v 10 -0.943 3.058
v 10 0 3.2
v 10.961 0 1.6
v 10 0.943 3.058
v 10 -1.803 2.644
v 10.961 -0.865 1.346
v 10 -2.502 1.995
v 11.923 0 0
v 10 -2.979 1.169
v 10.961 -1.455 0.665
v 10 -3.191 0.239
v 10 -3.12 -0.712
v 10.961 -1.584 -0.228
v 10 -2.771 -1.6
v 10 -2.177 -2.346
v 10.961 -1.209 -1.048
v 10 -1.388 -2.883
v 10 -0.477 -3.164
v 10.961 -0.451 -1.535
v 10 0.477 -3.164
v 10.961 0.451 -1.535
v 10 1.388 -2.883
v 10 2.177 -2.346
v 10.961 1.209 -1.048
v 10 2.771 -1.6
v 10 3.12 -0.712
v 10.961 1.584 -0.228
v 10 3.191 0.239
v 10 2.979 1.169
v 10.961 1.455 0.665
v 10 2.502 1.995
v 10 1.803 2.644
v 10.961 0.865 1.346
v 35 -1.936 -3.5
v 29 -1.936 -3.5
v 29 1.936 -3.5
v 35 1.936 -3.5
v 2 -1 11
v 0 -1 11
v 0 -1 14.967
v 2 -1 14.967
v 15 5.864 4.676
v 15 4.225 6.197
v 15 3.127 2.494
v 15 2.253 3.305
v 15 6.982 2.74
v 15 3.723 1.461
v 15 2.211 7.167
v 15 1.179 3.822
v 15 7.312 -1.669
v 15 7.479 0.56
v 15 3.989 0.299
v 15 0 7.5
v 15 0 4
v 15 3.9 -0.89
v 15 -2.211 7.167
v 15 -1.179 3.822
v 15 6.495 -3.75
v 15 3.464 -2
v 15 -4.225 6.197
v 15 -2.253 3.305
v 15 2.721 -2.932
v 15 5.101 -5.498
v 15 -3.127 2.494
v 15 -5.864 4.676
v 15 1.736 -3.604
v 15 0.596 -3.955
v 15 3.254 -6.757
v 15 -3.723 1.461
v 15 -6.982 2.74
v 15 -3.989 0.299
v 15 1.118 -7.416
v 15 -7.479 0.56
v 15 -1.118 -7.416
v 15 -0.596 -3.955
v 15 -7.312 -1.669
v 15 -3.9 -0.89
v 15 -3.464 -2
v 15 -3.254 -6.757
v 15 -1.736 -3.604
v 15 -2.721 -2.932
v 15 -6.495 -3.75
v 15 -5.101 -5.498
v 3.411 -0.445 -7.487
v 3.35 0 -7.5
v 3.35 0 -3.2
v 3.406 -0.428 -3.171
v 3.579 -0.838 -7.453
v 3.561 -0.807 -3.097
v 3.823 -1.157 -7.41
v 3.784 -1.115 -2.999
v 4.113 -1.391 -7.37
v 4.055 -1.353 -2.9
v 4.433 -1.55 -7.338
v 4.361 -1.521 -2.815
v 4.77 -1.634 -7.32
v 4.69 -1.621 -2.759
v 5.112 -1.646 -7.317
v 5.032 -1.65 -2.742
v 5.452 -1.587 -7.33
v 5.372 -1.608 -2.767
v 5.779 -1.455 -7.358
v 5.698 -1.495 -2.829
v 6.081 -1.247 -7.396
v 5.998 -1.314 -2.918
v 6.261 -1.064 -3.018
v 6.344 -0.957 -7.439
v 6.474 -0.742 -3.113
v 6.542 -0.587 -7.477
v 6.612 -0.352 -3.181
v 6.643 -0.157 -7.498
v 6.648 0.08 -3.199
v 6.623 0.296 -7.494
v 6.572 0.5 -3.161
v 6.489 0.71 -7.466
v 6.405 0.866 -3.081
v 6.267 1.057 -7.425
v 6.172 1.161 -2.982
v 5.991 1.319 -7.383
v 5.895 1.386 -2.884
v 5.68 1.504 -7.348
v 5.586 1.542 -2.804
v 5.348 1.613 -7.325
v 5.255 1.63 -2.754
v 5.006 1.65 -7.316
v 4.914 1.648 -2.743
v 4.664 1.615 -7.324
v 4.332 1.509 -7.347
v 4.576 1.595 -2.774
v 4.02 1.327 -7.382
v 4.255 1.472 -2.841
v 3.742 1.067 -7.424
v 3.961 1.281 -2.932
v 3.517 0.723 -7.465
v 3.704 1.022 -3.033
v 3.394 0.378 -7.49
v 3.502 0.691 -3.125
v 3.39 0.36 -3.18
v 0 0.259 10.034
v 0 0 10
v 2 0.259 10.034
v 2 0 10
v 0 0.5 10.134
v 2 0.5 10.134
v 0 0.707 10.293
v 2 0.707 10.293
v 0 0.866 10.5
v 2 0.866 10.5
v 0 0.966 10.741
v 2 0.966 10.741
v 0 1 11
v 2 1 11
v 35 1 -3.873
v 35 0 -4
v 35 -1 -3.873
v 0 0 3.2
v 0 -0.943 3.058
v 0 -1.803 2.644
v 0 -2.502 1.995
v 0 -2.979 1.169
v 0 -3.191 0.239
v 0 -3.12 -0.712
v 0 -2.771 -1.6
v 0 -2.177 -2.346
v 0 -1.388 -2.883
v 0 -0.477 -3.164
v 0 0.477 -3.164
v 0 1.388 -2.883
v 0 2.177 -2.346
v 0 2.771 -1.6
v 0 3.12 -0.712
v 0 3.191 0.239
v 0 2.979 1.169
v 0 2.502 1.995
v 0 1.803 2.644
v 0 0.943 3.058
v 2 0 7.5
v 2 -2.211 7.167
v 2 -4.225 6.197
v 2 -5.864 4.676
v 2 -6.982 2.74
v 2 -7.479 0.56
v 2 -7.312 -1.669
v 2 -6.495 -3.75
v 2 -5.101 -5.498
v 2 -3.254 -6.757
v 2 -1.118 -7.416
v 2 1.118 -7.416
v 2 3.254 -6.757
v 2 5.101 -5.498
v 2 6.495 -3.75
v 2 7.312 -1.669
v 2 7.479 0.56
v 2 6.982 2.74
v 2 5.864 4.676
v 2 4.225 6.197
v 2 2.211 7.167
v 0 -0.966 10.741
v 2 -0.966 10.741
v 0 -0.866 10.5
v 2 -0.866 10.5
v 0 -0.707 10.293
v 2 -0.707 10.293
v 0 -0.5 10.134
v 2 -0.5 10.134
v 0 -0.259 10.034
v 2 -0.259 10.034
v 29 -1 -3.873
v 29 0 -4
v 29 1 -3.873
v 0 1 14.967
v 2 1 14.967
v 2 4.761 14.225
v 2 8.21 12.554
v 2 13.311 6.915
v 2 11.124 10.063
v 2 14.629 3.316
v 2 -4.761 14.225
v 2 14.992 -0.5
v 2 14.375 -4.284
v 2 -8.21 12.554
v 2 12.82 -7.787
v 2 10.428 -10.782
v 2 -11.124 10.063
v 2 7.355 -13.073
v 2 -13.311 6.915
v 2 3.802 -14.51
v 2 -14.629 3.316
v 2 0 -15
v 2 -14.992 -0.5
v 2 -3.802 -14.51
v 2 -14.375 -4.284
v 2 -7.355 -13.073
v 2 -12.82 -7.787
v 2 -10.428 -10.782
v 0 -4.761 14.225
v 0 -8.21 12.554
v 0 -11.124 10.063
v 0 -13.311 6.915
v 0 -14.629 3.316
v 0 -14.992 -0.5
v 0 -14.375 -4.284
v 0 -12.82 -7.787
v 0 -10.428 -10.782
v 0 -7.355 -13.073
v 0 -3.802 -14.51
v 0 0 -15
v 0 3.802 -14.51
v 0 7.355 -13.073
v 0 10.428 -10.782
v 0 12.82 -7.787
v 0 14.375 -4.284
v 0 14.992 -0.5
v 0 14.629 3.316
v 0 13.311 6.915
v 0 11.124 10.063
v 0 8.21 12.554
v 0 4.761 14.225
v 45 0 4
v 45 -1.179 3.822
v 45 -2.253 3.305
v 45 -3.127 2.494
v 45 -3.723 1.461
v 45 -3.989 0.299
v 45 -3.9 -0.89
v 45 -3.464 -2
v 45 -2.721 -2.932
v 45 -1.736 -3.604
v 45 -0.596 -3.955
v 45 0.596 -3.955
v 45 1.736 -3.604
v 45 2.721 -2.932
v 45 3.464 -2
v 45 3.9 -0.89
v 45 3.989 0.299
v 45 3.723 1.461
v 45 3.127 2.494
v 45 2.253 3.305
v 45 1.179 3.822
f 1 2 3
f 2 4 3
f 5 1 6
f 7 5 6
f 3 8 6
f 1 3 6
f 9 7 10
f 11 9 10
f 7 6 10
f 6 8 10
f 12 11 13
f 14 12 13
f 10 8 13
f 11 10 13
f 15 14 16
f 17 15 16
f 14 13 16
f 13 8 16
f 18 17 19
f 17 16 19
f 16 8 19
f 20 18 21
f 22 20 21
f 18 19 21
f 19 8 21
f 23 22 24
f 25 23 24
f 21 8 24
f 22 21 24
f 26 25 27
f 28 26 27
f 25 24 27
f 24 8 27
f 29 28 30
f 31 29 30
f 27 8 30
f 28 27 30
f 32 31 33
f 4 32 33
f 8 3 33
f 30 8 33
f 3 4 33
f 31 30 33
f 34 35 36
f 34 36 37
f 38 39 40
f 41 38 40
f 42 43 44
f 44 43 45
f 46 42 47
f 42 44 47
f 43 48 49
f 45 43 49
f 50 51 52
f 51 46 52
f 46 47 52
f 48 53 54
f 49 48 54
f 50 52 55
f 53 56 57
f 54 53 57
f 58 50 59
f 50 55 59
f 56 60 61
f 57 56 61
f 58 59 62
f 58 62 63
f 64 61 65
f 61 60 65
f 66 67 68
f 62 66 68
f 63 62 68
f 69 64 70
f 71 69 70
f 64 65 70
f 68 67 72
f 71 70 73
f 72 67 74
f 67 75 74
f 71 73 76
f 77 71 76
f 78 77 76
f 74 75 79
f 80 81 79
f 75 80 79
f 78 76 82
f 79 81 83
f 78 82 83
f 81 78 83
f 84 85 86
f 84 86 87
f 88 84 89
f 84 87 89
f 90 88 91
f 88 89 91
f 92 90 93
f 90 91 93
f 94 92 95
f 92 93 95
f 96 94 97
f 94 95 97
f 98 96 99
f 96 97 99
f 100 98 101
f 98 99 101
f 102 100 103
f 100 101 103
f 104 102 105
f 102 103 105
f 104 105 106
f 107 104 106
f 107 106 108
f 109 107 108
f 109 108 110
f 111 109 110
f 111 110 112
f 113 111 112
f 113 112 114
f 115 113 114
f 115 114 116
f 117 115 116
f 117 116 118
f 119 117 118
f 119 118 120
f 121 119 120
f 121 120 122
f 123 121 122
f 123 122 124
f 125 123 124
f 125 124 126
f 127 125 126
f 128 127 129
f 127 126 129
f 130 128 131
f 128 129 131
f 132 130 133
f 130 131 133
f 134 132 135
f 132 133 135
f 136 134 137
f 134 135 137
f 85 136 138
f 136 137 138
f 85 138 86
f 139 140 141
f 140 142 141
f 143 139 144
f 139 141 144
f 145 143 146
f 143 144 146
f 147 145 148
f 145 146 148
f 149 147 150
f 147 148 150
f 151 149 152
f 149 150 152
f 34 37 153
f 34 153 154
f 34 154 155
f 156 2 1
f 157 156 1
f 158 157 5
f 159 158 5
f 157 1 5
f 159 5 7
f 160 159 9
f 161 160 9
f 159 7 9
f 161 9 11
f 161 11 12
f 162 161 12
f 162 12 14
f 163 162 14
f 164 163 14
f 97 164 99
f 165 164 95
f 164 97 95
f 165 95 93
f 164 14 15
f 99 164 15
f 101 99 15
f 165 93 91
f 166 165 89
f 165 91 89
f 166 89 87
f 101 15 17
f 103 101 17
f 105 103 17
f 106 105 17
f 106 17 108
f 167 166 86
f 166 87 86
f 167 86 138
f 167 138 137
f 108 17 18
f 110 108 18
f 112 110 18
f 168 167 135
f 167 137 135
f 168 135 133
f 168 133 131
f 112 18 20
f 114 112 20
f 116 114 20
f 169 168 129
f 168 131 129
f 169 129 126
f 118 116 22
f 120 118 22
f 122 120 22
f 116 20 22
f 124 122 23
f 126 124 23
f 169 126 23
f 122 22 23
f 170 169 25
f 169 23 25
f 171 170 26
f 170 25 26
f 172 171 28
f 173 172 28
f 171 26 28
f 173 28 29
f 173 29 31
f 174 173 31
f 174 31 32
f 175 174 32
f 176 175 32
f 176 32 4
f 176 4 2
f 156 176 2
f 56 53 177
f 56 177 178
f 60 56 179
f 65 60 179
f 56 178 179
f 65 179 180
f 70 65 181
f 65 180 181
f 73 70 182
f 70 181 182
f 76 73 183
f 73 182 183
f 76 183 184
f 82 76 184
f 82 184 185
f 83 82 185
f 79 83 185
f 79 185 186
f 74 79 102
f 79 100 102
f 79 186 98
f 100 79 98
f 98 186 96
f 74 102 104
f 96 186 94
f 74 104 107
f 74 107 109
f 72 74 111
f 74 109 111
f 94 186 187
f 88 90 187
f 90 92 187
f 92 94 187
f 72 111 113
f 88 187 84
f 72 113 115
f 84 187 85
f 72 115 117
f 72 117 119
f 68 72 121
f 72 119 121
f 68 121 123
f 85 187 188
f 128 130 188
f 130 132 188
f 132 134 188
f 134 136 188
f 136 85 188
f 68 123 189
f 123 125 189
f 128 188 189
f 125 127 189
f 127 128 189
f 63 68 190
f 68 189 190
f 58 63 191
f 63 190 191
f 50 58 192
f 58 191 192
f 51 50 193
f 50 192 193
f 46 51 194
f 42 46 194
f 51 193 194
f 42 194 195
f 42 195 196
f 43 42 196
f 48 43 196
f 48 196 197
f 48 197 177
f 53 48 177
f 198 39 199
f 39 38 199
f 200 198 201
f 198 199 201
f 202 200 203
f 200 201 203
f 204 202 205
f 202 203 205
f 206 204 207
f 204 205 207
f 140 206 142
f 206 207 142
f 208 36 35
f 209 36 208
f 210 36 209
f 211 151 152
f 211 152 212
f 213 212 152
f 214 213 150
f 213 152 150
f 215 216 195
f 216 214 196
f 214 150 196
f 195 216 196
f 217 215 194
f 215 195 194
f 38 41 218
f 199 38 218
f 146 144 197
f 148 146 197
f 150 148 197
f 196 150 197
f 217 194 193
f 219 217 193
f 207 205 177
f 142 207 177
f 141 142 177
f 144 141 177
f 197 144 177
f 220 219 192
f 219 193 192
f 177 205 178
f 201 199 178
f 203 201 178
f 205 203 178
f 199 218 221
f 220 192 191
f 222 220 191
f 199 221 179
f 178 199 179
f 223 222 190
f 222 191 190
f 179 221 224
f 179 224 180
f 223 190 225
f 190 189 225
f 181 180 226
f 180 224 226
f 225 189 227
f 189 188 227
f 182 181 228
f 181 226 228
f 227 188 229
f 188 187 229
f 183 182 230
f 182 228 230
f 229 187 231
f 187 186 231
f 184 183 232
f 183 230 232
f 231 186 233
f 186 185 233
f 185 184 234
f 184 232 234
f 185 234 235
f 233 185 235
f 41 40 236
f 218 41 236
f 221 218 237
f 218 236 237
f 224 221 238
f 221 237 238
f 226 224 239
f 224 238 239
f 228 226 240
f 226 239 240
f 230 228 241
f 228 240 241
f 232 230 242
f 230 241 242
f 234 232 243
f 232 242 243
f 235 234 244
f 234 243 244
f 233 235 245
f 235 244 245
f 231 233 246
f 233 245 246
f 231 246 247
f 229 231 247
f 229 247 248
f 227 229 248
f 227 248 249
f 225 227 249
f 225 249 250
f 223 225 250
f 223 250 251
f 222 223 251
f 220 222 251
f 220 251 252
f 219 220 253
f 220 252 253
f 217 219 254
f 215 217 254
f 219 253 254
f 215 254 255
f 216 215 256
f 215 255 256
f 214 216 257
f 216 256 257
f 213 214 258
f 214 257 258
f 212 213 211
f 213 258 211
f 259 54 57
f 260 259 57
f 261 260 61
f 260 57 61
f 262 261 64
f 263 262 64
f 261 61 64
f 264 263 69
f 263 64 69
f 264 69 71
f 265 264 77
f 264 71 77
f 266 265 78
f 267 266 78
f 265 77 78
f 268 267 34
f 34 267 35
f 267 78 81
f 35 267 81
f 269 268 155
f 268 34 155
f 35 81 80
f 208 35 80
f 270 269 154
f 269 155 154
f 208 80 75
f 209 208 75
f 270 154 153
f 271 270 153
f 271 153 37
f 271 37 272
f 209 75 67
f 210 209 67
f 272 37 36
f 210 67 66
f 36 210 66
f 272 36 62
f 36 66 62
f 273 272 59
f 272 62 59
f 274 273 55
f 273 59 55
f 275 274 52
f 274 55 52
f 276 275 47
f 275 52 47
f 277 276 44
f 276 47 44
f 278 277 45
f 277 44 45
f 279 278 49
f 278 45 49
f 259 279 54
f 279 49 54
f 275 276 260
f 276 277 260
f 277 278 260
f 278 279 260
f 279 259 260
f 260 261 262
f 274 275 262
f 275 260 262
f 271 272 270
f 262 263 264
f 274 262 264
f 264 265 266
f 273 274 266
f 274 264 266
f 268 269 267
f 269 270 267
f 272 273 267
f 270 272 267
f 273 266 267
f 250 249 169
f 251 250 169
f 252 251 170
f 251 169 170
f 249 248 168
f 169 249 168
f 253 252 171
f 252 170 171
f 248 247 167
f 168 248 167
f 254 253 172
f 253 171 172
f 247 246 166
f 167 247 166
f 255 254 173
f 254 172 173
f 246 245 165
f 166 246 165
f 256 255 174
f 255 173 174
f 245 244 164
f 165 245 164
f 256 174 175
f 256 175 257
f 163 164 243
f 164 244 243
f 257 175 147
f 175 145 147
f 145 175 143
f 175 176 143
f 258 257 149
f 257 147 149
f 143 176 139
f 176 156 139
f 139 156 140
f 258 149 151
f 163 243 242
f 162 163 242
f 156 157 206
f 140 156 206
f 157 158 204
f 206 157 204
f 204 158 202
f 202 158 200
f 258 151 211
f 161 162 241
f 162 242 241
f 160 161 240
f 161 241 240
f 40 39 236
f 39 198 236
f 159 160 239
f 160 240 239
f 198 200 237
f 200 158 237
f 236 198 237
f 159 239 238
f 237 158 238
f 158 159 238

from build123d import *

# Parameters (mm, degrees)
SCHNITT_LINEAR_AUSTRAGEN1_DEPTH      = 50.749371855
SCHNITT_LINEAR_AUSTRAGEN1_DEPTH_BACK = 50.749371855
SKIZZE3_W                            = 6
SKIZZE3_H                            = 0.5
M4_GEWINDEBOHRUNG2_D                 = 3.3
M4_GEWINDEBOHRUNG2_DEPTH             = 8.5
M4_GEWINDEBOHRUNG2_TIP               = 0.991420021
SKIZZE10_W                           = 5.838792557
SKIZZE10_H                           = 2
SCHNITT_LINEAR_AUSTRAGEN2_DEPTH      = 2
VERRUNDUNG1_R                        = 1


with BuildPart() as part:
    # Skizze1 → Rotation1 (revolve)
    with BuildSketch(Plane.XY, mode=Mode.PRIVATE) as rotation1_sk:
        Polygon((0, 3.2), (10, 3.2), (11.922753981, 0), (45, 0), (45, 4), (15, 4), (15, 7.5), (2, 7.5), (2, 15), (0, 15), (0, 7.5), align=None)
    revolve(rotation1_sk.sketch.rotate(Axis((0, 0, 0), (1, 0, 0)), 90), axis=Axis((0, 0, 0), (1, 0, 0)))

    # Skizze3 → Schnitt-Linear austragen1 (cut, two sides: drawn at the far end of the back side and taken through both)
    with BuildSketch(Plane(origin=(0, 0, 0), x_dir=(1, 0, 0), z_dir=(0, 1, 0)).offset(-SCHNITT_LINEAR_AUSTRAGEN1_DEPTH_BACK)):
        with Locations((32, 3.75)):
            Rectangle(SKIZZE3_W, SKIZZE3_H)
    extrude(amount=SCHNITT_LINEAR_AUSTRAGEN1_DEPTH + SCHNITT_LINEAR_AUSTRAGEN1_DEPTH_BACK, mode=Mode.SUBTRACT)

    # M4 Gewindebohrung2
    with Locations(Plane(origin=(0, 0, -7.5), x_dir=(1, 0, 0), z_dir=(0, 0, -1))):
        with Locations((5, 0)):
            Hole(M4_GEWINDEBOHRUNG2_D / 2, depth=M4_GEWINDEBOHRUNG2_DEPTH)
            with Locations((0, 0, -(M4_GEWINDEBOHRUNG2_DEPTH + M4_GEWINDEBOHRUNG2_TIP / 2))):  # 118° drill point
                Cone(0, M4_GEWINDEBOHRUNG2_D / 2, M4_GEWINDEBOHRUNG2_TIP, mode=Mode.SUBTRACT)

    # Skizze10 → Schnitt-Linear austragen2 (cut)
    with BuildSketch(Plane.ZY):
        with Locations((12.919396279, 0)):
            Rectangle(SKIZZE10_W, SKIZZE10_H)
    extrude(amount=-SCHNITT_LINEAR_AUSTRAGEN2_DEPTH, mode=Mode.SUBTRACT)

    # Verrundung1
    verrundung1_edges = [part.edges().sort_by_distance(p)[0] for p in [
        (1, -1, 10),
        (1, 1, 10),
    ]]
    fillet(verrundung1_edges, radius=VERRUNDUNG1_R - 0.0001)  # a hair under: the kernel refuses the full size


solid = part.part
